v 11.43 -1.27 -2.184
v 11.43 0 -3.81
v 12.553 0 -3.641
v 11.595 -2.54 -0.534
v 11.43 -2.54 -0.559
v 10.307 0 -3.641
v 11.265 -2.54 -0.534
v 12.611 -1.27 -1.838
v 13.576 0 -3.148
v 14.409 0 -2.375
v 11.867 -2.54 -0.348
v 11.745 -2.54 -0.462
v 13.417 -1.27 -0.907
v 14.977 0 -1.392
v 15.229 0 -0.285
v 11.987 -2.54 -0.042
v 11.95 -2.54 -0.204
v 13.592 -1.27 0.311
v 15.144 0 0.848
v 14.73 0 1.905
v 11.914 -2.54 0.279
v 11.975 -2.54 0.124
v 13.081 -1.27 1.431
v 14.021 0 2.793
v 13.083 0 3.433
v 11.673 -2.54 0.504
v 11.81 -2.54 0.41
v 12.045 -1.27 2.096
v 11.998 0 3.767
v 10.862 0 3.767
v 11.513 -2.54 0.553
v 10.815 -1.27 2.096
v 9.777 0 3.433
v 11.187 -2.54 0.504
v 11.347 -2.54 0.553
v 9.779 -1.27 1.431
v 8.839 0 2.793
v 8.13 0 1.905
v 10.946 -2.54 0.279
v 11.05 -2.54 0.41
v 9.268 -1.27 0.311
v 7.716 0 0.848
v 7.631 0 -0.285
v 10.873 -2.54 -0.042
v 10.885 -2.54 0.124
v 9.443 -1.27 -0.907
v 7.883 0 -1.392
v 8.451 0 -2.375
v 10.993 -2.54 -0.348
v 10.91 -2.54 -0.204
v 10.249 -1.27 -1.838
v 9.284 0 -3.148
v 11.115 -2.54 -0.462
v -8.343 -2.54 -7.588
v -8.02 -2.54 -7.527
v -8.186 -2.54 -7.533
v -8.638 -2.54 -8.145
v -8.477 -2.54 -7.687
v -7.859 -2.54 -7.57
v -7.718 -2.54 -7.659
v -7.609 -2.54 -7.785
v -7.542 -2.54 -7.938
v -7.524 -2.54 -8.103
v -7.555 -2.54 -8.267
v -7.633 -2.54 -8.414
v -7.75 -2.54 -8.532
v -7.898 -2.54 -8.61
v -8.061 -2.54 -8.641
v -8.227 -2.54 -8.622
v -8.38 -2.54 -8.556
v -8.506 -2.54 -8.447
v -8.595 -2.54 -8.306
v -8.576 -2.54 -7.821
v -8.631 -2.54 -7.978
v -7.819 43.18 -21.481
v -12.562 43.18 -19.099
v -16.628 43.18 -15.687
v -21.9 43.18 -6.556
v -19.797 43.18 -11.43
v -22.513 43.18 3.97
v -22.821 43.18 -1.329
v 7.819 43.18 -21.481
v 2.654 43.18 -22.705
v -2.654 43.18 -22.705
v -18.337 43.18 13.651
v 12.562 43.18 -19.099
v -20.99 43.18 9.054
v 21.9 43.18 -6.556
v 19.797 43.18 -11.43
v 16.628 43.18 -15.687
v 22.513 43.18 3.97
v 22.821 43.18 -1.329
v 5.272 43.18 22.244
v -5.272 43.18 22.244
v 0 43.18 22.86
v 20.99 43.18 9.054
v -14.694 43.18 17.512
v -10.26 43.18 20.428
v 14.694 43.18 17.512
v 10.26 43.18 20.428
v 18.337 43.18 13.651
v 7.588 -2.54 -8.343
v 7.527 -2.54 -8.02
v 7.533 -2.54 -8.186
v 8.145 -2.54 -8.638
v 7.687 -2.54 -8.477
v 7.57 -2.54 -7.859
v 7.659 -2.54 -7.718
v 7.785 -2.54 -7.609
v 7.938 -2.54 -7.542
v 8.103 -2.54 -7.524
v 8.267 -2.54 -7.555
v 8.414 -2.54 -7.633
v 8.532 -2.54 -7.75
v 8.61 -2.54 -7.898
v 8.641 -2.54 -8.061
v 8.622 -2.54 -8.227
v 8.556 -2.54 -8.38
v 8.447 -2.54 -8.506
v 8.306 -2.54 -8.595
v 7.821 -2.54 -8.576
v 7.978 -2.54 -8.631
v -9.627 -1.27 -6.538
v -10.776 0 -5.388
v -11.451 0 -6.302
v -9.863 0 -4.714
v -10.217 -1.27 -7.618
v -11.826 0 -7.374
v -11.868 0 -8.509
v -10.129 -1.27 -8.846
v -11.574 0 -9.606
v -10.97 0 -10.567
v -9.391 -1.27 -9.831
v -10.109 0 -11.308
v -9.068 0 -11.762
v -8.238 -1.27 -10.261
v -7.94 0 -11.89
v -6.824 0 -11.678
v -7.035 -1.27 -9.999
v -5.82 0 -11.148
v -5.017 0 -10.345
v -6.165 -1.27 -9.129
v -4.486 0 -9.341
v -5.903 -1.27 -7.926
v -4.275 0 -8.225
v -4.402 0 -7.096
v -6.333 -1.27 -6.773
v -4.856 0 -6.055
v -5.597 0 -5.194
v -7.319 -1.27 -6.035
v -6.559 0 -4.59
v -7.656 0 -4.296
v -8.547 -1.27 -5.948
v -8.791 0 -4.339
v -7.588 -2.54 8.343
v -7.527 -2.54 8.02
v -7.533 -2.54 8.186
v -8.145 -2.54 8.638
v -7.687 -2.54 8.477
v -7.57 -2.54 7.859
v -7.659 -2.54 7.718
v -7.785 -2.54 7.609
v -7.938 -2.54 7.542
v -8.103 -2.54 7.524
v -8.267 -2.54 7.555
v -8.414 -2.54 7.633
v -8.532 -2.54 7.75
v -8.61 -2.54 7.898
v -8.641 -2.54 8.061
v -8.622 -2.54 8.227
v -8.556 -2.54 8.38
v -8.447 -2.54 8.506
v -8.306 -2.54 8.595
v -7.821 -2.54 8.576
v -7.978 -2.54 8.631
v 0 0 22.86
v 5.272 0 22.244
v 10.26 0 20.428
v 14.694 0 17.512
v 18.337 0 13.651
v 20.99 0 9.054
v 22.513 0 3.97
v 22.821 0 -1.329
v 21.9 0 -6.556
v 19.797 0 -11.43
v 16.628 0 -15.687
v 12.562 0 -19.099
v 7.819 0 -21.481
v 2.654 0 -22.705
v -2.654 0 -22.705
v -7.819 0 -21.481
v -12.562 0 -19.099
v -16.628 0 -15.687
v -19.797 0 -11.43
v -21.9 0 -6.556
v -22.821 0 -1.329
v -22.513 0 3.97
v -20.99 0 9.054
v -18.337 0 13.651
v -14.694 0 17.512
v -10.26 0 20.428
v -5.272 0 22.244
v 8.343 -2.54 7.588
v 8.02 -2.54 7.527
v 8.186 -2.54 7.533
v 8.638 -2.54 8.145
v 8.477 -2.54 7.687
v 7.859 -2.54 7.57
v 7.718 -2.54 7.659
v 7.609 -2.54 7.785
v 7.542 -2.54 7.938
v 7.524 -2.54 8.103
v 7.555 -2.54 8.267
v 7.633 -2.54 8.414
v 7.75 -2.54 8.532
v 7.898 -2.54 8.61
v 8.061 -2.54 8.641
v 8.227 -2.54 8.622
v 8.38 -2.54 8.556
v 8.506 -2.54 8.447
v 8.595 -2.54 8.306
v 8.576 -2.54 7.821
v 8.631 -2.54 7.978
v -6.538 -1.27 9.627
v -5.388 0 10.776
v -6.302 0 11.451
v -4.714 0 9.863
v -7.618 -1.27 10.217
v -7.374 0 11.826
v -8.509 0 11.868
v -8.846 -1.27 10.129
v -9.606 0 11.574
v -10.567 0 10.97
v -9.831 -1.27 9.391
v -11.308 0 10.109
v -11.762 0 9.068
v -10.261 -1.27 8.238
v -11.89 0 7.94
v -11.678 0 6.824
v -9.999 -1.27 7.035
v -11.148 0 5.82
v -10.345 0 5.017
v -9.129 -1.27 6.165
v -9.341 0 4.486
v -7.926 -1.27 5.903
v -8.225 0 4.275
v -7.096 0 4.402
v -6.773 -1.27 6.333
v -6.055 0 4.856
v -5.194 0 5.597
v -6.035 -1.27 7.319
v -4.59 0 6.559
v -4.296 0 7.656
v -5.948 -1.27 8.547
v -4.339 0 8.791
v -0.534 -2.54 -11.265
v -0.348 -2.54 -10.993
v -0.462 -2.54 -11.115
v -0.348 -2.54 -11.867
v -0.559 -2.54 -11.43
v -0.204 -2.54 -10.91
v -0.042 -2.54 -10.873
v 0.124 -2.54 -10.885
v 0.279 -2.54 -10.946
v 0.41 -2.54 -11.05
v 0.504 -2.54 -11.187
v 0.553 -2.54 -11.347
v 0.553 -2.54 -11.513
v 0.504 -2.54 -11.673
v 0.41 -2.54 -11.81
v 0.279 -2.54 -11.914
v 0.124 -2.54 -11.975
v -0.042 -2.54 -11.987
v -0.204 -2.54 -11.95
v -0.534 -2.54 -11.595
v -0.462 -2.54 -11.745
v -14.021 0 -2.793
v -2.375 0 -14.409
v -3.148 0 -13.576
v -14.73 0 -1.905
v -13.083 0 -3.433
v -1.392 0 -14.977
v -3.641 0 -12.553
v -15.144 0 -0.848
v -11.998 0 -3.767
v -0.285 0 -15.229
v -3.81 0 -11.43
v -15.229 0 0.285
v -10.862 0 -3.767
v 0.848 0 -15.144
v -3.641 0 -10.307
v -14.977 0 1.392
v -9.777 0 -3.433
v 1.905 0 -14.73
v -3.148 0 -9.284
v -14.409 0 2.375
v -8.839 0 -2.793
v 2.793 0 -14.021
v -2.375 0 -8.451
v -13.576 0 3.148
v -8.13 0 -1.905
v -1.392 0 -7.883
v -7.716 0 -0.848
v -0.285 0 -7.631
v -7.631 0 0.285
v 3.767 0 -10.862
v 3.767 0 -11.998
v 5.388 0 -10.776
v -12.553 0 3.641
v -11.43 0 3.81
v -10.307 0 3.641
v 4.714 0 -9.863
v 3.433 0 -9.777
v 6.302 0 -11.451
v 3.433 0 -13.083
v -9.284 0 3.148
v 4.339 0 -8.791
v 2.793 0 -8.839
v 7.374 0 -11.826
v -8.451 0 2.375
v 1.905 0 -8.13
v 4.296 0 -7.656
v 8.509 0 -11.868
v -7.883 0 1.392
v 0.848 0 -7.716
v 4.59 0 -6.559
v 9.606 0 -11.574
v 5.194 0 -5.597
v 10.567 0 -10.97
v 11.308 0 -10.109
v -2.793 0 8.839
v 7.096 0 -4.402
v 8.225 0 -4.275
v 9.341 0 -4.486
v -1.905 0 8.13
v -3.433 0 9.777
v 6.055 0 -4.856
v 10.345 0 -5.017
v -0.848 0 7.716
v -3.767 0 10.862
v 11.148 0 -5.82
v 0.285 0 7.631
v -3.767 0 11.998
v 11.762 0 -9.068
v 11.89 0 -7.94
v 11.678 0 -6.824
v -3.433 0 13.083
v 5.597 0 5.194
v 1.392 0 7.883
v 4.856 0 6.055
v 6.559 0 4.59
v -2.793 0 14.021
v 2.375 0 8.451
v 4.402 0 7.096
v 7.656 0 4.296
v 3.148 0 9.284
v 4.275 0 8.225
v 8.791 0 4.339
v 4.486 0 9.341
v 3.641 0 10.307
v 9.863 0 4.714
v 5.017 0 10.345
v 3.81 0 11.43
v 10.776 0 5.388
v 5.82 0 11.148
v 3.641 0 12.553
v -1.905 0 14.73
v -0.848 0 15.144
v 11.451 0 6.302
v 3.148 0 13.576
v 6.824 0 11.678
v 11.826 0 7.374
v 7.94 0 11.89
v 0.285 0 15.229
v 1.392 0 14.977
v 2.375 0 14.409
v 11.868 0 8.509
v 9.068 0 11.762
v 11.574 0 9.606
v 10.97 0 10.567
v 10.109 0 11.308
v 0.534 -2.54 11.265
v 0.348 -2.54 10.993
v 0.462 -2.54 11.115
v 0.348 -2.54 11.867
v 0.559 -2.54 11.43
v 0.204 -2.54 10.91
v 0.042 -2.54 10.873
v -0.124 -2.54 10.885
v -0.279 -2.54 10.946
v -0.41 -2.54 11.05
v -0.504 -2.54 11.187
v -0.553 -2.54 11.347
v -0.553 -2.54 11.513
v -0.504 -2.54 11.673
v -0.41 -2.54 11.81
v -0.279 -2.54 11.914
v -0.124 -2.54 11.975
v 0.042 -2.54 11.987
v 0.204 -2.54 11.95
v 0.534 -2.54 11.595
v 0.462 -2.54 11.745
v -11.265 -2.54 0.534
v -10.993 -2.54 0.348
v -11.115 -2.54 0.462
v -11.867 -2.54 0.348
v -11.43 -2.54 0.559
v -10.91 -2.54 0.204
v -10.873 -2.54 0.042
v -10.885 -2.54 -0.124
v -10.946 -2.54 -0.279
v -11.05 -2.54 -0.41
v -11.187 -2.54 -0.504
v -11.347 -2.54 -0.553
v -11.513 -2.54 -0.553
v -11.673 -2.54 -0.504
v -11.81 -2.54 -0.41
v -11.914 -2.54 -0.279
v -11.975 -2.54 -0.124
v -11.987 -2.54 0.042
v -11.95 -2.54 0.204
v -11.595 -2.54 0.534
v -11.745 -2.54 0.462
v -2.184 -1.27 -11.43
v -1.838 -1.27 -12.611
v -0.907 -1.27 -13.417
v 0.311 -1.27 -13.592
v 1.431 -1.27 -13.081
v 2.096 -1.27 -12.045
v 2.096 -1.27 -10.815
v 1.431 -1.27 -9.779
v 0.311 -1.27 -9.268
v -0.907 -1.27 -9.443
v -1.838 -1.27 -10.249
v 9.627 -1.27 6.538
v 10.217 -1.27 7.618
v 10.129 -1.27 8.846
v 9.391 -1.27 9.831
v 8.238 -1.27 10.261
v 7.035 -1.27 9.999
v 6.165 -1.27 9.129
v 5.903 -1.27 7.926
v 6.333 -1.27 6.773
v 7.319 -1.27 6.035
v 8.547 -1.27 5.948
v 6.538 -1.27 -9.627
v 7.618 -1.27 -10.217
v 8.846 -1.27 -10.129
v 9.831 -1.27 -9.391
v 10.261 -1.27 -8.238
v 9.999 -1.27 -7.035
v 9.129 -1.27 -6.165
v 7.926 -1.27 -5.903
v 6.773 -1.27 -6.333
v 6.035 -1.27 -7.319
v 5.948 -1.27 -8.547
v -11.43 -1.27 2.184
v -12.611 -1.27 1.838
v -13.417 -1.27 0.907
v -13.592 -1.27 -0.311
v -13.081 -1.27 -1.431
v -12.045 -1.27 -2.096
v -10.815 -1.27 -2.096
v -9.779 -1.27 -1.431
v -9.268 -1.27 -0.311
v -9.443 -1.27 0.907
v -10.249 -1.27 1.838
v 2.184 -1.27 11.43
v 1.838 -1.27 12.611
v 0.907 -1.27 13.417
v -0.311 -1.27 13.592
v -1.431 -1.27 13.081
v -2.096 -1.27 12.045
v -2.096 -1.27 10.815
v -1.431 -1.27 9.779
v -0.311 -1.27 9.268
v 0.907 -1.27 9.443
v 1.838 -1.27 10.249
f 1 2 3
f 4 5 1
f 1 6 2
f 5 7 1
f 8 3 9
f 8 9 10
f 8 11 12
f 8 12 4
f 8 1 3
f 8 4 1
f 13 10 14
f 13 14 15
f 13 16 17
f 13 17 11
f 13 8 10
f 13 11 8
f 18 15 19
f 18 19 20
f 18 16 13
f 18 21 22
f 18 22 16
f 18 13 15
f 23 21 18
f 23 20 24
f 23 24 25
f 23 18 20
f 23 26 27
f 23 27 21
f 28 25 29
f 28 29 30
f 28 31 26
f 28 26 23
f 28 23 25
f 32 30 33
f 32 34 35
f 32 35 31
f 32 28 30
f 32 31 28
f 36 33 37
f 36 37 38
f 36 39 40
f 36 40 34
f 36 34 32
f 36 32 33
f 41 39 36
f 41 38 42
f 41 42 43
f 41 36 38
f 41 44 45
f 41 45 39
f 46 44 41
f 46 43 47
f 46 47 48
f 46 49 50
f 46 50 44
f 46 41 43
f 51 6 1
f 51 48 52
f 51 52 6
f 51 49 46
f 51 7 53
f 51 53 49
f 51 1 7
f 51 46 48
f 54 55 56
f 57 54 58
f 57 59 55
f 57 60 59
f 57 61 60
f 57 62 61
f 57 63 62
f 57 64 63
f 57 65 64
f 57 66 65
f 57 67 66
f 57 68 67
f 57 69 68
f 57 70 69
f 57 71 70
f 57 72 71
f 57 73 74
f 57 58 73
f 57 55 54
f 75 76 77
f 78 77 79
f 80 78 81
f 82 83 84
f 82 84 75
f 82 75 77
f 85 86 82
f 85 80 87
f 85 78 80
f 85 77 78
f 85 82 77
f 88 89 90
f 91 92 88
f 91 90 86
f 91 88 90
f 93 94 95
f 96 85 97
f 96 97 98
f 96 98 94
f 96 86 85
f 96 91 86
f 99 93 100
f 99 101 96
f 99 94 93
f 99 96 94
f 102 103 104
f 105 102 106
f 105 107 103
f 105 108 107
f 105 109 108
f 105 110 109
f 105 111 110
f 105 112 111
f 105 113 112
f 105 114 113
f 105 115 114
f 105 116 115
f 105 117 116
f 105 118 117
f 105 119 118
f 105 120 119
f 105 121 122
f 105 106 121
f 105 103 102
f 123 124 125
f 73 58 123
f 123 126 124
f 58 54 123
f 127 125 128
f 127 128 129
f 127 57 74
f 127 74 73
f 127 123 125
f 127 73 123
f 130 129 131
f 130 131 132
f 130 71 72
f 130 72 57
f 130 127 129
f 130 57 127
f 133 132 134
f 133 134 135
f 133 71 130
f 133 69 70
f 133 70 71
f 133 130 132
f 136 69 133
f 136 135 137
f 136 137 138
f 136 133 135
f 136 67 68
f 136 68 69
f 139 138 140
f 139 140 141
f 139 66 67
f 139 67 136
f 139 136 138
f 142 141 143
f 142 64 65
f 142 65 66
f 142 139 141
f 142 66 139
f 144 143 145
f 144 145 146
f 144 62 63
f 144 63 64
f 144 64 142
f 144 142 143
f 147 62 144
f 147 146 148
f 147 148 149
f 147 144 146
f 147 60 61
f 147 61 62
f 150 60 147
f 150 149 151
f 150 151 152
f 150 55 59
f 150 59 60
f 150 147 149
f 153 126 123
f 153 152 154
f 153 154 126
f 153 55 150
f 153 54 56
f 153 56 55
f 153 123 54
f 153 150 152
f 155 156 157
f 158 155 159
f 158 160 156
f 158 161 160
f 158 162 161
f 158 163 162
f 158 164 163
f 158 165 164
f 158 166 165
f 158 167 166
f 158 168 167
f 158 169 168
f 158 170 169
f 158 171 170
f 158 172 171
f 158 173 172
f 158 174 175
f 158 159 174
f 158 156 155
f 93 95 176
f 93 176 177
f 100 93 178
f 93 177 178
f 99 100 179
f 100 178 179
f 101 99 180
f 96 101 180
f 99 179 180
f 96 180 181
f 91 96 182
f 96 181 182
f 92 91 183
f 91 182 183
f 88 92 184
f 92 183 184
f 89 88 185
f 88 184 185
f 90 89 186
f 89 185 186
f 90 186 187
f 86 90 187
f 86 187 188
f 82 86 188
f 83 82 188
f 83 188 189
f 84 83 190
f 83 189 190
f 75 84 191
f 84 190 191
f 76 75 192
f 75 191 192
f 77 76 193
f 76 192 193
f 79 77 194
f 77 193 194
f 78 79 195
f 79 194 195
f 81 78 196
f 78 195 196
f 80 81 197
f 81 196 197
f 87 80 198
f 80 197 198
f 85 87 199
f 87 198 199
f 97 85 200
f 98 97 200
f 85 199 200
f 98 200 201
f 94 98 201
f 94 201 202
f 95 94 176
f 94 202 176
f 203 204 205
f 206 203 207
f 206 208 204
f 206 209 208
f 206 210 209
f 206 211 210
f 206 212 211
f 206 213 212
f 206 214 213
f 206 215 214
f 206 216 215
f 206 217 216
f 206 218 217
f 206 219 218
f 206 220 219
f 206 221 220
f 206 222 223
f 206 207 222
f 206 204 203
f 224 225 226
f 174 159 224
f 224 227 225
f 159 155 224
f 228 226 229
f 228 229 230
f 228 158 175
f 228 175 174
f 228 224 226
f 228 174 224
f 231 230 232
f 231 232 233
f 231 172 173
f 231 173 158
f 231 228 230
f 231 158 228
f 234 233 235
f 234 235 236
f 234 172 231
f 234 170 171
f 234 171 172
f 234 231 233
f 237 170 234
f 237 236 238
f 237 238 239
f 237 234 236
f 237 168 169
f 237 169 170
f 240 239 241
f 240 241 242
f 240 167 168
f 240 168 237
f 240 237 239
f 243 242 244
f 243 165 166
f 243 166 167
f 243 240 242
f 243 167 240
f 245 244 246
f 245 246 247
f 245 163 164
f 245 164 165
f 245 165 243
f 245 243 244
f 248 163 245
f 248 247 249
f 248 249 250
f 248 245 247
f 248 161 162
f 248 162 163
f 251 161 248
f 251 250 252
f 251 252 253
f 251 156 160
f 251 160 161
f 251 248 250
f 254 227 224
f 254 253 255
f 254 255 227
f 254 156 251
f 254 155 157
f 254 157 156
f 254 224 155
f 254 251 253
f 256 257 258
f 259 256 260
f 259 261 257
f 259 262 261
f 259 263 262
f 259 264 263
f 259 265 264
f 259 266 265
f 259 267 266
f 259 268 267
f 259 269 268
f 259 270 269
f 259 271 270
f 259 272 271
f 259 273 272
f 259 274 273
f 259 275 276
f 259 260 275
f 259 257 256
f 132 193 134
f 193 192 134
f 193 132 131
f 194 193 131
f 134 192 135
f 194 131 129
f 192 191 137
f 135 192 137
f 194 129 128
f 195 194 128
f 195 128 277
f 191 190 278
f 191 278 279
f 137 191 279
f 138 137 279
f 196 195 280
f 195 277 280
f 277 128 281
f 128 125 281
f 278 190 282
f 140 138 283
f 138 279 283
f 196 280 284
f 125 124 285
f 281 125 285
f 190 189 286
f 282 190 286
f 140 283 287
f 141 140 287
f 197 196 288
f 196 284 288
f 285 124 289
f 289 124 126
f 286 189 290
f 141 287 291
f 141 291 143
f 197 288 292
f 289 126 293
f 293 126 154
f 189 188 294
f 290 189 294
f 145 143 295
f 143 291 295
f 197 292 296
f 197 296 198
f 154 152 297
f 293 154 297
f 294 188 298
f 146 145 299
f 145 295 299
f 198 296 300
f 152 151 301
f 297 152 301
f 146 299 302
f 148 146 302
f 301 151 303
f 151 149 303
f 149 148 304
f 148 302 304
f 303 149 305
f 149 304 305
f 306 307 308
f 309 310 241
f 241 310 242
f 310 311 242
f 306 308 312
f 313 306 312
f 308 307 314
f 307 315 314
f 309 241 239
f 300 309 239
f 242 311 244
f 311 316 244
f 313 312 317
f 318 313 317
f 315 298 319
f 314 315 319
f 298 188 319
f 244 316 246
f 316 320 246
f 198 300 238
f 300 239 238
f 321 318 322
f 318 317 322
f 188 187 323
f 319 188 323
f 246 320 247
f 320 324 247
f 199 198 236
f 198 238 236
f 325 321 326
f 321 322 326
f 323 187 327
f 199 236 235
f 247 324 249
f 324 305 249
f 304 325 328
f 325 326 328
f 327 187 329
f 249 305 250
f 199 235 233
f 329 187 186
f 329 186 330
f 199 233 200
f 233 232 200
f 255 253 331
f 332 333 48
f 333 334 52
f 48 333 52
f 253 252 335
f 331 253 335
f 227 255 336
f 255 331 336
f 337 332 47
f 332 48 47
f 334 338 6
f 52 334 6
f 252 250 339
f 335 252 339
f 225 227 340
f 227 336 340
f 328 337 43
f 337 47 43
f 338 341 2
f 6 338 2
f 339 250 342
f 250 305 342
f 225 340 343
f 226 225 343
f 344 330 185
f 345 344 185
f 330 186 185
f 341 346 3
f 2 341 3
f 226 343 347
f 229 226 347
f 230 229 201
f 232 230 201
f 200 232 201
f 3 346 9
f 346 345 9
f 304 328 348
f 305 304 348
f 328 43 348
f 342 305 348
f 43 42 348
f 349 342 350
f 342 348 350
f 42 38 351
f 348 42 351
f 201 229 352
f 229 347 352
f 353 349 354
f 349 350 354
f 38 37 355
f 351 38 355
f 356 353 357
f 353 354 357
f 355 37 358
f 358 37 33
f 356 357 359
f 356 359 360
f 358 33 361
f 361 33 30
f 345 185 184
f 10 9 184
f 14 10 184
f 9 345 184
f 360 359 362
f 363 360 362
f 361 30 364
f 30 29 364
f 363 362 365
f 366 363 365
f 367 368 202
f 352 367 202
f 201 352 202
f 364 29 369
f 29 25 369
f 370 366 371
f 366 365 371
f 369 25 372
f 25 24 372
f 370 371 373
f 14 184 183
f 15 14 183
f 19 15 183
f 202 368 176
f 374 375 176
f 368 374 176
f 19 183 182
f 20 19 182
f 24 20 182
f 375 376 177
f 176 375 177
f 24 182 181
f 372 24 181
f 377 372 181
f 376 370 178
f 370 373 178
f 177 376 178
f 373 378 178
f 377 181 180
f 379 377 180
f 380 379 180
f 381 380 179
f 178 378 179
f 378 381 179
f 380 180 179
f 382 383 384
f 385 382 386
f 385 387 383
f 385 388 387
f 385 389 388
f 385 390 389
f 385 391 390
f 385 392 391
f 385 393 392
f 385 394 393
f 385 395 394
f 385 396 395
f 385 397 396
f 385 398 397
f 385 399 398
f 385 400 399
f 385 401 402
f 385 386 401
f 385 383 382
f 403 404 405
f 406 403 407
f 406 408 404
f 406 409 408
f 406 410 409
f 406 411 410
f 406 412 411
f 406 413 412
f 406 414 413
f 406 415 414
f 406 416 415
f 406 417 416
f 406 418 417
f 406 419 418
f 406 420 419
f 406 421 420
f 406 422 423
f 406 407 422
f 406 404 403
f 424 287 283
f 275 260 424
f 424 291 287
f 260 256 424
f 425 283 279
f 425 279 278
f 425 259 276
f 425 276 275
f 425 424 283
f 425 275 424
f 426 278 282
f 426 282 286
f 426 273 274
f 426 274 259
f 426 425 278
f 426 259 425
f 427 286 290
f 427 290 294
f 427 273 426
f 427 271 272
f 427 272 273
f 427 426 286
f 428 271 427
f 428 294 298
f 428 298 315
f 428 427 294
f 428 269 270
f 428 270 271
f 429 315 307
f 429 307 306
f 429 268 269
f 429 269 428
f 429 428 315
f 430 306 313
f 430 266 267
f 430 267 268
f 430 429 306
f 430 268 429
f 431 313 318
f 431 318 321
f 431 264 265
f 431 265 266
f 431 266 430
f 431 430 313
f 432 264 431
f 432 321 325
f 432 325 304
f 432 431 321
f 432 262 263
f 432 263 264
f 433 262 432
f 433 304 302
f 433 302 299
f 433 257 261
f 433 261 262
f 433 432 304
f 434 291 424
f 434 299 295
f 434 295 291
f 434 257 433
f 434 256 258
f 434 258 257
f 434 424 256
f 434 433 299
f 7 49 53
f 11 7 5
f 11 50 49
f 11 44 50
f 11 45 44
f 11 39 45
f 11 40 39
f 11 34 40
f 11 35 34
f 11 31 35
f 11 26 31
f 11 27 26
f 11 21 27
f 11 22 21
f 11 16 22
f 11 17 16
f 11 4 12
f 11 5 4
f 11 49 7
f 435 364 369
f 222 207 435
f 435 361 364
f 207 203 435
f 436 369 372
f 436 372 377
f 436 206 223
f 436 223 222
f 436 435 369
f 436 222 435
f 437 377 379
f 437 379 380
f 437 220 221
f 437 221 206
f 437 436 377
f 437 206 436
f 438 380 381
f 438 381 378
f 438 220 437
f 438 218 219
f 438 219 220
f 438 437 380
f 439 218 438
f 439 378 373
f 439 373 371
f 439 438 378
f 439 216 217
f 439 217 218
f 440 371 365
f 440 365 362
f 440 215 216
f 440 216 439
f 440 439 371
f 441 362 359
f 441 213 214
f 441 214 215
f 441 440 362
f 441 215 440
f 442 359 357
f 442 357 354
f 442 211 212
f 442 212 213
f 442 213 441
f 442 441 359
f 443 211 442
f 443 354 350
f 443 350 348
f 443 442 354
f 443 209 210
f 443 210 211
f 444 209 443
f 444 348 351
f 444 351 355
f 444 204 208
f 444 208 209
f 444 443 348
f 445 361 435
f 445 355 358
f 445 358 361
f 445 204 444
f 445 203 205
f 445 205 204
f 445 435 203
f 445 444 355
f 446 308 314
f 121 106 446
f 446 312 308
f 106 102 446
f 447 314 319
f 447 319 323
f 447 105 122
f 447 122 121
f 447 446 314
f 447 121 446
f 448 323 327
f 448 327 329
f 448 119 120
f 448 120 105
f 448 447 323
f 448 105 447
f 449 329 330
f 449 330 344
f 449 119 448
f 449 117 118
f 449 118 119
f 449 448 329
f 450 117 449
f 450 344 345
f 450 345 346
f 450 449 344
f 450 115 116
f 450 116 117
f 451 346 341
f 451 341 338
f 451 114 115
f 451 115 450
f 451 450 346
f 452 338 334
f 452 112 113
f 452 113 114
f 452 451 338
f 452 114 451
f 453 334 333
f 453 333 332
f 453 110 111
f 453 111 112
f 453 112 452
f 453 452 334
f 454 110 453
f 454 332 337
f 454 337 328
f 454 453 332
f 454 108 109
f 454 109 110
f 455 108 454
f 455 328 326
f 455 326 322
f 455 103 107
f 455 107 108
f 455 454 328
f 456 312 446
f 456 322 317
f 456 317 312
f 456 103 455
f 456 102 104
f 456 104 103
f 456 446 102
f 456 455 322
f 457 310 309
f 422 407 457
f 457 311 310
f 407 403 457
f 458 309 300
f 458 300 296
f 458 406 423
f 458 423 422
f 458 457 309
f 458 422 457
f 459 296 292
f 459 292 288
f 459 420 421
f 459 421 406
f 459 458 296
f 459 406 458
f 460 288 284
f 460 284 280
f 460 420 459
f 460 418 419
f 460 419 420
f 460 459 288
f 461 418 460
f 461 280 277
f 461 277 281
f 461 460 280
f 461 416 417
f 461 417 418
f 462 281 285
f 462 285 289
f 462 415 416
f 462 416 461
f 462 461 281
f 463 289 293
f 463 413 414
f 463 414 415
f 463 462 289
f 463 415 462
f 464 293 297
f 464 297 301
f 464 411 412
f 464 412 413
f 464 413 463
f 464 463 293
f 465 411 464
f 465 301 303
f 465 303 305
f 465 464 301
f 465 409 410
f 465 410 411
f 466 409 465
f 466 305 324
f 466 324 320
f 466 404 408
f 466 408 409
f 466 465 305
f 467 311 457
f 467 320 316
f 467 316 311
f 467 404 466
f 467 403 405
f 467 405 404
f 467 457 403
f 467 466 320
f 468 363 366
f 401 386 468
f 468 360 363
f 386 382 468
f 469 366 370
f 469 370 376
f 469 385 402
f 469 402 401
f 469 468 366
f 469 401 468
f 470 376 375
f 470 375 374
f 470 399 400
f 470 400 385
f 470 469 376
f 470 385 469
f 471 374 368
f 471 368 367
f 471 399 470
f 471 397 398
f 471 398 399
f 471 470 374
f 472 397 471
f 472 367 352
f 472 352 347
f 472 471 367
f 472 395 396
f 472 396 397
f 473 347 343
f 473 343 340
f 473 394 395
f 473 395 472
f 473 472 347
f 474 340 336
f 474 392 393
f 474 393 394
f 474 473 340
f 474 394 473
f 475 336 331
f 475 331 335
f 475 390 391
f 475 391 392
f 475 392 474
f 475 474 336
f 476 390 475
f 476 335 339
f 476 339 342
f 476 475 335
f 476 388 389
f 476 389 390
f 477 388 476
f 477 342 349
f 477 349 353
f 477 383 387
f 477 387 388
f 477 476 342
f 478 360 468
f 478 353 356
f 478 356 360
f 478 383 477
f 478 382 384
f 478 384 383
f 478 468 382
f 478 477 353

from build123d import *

# Parameters (mm, degrees)
SKETCH1_R           = 22.86
BOSS_EXTRUDE1_DEPTH = 43.18
SKETCH3_R           = 3.81
BOSS_EXTRUDE2_DEPTH = 2.54
BOSS_EXTRUDE2_TAPER = 52
CIRPATTERN1_COUNT   = 8


with BuildPart() as part:
    # Sketch1 → Boss-Extrude1 (new body)
    with BuildSketch(Plane(origin=(0, 0, 0), x_dir=(1, 0, 0), z_dir=(0, 1, 0))):
        Circle(SKETCH1_R)
    extrude(amount=BOSS_EXTRUDE1_DEPTH)

    # Sketch3 → Boss-Extrude2 (add)
    with BuildSketch(Plane(origin=(0, 0, 0), x_dir=(-1, 0, 0), z_dir=(0, -1, 0))):
        with Locations((0, 11.43)):
            Circle(SKETCH3_R)
    boss_extrude2 = extrude(amount=BOSS_EXTRUDE2_DEPTH, taper=BOSS_EXTRUDE2_TAPER)

    # CirPattern1: Boss-Extrude2 ×8 about axis
    cirpattern1_axis = Axis((0, 43.18, 0), (0, -1, 0))
    for i in range(1, CIRPATTERN1_COUNT):
        add(boss_extrude2.rotate(cirpattern1_axis, i * 360 / CIRPATTERN1_COUNT))


solid = part.part
